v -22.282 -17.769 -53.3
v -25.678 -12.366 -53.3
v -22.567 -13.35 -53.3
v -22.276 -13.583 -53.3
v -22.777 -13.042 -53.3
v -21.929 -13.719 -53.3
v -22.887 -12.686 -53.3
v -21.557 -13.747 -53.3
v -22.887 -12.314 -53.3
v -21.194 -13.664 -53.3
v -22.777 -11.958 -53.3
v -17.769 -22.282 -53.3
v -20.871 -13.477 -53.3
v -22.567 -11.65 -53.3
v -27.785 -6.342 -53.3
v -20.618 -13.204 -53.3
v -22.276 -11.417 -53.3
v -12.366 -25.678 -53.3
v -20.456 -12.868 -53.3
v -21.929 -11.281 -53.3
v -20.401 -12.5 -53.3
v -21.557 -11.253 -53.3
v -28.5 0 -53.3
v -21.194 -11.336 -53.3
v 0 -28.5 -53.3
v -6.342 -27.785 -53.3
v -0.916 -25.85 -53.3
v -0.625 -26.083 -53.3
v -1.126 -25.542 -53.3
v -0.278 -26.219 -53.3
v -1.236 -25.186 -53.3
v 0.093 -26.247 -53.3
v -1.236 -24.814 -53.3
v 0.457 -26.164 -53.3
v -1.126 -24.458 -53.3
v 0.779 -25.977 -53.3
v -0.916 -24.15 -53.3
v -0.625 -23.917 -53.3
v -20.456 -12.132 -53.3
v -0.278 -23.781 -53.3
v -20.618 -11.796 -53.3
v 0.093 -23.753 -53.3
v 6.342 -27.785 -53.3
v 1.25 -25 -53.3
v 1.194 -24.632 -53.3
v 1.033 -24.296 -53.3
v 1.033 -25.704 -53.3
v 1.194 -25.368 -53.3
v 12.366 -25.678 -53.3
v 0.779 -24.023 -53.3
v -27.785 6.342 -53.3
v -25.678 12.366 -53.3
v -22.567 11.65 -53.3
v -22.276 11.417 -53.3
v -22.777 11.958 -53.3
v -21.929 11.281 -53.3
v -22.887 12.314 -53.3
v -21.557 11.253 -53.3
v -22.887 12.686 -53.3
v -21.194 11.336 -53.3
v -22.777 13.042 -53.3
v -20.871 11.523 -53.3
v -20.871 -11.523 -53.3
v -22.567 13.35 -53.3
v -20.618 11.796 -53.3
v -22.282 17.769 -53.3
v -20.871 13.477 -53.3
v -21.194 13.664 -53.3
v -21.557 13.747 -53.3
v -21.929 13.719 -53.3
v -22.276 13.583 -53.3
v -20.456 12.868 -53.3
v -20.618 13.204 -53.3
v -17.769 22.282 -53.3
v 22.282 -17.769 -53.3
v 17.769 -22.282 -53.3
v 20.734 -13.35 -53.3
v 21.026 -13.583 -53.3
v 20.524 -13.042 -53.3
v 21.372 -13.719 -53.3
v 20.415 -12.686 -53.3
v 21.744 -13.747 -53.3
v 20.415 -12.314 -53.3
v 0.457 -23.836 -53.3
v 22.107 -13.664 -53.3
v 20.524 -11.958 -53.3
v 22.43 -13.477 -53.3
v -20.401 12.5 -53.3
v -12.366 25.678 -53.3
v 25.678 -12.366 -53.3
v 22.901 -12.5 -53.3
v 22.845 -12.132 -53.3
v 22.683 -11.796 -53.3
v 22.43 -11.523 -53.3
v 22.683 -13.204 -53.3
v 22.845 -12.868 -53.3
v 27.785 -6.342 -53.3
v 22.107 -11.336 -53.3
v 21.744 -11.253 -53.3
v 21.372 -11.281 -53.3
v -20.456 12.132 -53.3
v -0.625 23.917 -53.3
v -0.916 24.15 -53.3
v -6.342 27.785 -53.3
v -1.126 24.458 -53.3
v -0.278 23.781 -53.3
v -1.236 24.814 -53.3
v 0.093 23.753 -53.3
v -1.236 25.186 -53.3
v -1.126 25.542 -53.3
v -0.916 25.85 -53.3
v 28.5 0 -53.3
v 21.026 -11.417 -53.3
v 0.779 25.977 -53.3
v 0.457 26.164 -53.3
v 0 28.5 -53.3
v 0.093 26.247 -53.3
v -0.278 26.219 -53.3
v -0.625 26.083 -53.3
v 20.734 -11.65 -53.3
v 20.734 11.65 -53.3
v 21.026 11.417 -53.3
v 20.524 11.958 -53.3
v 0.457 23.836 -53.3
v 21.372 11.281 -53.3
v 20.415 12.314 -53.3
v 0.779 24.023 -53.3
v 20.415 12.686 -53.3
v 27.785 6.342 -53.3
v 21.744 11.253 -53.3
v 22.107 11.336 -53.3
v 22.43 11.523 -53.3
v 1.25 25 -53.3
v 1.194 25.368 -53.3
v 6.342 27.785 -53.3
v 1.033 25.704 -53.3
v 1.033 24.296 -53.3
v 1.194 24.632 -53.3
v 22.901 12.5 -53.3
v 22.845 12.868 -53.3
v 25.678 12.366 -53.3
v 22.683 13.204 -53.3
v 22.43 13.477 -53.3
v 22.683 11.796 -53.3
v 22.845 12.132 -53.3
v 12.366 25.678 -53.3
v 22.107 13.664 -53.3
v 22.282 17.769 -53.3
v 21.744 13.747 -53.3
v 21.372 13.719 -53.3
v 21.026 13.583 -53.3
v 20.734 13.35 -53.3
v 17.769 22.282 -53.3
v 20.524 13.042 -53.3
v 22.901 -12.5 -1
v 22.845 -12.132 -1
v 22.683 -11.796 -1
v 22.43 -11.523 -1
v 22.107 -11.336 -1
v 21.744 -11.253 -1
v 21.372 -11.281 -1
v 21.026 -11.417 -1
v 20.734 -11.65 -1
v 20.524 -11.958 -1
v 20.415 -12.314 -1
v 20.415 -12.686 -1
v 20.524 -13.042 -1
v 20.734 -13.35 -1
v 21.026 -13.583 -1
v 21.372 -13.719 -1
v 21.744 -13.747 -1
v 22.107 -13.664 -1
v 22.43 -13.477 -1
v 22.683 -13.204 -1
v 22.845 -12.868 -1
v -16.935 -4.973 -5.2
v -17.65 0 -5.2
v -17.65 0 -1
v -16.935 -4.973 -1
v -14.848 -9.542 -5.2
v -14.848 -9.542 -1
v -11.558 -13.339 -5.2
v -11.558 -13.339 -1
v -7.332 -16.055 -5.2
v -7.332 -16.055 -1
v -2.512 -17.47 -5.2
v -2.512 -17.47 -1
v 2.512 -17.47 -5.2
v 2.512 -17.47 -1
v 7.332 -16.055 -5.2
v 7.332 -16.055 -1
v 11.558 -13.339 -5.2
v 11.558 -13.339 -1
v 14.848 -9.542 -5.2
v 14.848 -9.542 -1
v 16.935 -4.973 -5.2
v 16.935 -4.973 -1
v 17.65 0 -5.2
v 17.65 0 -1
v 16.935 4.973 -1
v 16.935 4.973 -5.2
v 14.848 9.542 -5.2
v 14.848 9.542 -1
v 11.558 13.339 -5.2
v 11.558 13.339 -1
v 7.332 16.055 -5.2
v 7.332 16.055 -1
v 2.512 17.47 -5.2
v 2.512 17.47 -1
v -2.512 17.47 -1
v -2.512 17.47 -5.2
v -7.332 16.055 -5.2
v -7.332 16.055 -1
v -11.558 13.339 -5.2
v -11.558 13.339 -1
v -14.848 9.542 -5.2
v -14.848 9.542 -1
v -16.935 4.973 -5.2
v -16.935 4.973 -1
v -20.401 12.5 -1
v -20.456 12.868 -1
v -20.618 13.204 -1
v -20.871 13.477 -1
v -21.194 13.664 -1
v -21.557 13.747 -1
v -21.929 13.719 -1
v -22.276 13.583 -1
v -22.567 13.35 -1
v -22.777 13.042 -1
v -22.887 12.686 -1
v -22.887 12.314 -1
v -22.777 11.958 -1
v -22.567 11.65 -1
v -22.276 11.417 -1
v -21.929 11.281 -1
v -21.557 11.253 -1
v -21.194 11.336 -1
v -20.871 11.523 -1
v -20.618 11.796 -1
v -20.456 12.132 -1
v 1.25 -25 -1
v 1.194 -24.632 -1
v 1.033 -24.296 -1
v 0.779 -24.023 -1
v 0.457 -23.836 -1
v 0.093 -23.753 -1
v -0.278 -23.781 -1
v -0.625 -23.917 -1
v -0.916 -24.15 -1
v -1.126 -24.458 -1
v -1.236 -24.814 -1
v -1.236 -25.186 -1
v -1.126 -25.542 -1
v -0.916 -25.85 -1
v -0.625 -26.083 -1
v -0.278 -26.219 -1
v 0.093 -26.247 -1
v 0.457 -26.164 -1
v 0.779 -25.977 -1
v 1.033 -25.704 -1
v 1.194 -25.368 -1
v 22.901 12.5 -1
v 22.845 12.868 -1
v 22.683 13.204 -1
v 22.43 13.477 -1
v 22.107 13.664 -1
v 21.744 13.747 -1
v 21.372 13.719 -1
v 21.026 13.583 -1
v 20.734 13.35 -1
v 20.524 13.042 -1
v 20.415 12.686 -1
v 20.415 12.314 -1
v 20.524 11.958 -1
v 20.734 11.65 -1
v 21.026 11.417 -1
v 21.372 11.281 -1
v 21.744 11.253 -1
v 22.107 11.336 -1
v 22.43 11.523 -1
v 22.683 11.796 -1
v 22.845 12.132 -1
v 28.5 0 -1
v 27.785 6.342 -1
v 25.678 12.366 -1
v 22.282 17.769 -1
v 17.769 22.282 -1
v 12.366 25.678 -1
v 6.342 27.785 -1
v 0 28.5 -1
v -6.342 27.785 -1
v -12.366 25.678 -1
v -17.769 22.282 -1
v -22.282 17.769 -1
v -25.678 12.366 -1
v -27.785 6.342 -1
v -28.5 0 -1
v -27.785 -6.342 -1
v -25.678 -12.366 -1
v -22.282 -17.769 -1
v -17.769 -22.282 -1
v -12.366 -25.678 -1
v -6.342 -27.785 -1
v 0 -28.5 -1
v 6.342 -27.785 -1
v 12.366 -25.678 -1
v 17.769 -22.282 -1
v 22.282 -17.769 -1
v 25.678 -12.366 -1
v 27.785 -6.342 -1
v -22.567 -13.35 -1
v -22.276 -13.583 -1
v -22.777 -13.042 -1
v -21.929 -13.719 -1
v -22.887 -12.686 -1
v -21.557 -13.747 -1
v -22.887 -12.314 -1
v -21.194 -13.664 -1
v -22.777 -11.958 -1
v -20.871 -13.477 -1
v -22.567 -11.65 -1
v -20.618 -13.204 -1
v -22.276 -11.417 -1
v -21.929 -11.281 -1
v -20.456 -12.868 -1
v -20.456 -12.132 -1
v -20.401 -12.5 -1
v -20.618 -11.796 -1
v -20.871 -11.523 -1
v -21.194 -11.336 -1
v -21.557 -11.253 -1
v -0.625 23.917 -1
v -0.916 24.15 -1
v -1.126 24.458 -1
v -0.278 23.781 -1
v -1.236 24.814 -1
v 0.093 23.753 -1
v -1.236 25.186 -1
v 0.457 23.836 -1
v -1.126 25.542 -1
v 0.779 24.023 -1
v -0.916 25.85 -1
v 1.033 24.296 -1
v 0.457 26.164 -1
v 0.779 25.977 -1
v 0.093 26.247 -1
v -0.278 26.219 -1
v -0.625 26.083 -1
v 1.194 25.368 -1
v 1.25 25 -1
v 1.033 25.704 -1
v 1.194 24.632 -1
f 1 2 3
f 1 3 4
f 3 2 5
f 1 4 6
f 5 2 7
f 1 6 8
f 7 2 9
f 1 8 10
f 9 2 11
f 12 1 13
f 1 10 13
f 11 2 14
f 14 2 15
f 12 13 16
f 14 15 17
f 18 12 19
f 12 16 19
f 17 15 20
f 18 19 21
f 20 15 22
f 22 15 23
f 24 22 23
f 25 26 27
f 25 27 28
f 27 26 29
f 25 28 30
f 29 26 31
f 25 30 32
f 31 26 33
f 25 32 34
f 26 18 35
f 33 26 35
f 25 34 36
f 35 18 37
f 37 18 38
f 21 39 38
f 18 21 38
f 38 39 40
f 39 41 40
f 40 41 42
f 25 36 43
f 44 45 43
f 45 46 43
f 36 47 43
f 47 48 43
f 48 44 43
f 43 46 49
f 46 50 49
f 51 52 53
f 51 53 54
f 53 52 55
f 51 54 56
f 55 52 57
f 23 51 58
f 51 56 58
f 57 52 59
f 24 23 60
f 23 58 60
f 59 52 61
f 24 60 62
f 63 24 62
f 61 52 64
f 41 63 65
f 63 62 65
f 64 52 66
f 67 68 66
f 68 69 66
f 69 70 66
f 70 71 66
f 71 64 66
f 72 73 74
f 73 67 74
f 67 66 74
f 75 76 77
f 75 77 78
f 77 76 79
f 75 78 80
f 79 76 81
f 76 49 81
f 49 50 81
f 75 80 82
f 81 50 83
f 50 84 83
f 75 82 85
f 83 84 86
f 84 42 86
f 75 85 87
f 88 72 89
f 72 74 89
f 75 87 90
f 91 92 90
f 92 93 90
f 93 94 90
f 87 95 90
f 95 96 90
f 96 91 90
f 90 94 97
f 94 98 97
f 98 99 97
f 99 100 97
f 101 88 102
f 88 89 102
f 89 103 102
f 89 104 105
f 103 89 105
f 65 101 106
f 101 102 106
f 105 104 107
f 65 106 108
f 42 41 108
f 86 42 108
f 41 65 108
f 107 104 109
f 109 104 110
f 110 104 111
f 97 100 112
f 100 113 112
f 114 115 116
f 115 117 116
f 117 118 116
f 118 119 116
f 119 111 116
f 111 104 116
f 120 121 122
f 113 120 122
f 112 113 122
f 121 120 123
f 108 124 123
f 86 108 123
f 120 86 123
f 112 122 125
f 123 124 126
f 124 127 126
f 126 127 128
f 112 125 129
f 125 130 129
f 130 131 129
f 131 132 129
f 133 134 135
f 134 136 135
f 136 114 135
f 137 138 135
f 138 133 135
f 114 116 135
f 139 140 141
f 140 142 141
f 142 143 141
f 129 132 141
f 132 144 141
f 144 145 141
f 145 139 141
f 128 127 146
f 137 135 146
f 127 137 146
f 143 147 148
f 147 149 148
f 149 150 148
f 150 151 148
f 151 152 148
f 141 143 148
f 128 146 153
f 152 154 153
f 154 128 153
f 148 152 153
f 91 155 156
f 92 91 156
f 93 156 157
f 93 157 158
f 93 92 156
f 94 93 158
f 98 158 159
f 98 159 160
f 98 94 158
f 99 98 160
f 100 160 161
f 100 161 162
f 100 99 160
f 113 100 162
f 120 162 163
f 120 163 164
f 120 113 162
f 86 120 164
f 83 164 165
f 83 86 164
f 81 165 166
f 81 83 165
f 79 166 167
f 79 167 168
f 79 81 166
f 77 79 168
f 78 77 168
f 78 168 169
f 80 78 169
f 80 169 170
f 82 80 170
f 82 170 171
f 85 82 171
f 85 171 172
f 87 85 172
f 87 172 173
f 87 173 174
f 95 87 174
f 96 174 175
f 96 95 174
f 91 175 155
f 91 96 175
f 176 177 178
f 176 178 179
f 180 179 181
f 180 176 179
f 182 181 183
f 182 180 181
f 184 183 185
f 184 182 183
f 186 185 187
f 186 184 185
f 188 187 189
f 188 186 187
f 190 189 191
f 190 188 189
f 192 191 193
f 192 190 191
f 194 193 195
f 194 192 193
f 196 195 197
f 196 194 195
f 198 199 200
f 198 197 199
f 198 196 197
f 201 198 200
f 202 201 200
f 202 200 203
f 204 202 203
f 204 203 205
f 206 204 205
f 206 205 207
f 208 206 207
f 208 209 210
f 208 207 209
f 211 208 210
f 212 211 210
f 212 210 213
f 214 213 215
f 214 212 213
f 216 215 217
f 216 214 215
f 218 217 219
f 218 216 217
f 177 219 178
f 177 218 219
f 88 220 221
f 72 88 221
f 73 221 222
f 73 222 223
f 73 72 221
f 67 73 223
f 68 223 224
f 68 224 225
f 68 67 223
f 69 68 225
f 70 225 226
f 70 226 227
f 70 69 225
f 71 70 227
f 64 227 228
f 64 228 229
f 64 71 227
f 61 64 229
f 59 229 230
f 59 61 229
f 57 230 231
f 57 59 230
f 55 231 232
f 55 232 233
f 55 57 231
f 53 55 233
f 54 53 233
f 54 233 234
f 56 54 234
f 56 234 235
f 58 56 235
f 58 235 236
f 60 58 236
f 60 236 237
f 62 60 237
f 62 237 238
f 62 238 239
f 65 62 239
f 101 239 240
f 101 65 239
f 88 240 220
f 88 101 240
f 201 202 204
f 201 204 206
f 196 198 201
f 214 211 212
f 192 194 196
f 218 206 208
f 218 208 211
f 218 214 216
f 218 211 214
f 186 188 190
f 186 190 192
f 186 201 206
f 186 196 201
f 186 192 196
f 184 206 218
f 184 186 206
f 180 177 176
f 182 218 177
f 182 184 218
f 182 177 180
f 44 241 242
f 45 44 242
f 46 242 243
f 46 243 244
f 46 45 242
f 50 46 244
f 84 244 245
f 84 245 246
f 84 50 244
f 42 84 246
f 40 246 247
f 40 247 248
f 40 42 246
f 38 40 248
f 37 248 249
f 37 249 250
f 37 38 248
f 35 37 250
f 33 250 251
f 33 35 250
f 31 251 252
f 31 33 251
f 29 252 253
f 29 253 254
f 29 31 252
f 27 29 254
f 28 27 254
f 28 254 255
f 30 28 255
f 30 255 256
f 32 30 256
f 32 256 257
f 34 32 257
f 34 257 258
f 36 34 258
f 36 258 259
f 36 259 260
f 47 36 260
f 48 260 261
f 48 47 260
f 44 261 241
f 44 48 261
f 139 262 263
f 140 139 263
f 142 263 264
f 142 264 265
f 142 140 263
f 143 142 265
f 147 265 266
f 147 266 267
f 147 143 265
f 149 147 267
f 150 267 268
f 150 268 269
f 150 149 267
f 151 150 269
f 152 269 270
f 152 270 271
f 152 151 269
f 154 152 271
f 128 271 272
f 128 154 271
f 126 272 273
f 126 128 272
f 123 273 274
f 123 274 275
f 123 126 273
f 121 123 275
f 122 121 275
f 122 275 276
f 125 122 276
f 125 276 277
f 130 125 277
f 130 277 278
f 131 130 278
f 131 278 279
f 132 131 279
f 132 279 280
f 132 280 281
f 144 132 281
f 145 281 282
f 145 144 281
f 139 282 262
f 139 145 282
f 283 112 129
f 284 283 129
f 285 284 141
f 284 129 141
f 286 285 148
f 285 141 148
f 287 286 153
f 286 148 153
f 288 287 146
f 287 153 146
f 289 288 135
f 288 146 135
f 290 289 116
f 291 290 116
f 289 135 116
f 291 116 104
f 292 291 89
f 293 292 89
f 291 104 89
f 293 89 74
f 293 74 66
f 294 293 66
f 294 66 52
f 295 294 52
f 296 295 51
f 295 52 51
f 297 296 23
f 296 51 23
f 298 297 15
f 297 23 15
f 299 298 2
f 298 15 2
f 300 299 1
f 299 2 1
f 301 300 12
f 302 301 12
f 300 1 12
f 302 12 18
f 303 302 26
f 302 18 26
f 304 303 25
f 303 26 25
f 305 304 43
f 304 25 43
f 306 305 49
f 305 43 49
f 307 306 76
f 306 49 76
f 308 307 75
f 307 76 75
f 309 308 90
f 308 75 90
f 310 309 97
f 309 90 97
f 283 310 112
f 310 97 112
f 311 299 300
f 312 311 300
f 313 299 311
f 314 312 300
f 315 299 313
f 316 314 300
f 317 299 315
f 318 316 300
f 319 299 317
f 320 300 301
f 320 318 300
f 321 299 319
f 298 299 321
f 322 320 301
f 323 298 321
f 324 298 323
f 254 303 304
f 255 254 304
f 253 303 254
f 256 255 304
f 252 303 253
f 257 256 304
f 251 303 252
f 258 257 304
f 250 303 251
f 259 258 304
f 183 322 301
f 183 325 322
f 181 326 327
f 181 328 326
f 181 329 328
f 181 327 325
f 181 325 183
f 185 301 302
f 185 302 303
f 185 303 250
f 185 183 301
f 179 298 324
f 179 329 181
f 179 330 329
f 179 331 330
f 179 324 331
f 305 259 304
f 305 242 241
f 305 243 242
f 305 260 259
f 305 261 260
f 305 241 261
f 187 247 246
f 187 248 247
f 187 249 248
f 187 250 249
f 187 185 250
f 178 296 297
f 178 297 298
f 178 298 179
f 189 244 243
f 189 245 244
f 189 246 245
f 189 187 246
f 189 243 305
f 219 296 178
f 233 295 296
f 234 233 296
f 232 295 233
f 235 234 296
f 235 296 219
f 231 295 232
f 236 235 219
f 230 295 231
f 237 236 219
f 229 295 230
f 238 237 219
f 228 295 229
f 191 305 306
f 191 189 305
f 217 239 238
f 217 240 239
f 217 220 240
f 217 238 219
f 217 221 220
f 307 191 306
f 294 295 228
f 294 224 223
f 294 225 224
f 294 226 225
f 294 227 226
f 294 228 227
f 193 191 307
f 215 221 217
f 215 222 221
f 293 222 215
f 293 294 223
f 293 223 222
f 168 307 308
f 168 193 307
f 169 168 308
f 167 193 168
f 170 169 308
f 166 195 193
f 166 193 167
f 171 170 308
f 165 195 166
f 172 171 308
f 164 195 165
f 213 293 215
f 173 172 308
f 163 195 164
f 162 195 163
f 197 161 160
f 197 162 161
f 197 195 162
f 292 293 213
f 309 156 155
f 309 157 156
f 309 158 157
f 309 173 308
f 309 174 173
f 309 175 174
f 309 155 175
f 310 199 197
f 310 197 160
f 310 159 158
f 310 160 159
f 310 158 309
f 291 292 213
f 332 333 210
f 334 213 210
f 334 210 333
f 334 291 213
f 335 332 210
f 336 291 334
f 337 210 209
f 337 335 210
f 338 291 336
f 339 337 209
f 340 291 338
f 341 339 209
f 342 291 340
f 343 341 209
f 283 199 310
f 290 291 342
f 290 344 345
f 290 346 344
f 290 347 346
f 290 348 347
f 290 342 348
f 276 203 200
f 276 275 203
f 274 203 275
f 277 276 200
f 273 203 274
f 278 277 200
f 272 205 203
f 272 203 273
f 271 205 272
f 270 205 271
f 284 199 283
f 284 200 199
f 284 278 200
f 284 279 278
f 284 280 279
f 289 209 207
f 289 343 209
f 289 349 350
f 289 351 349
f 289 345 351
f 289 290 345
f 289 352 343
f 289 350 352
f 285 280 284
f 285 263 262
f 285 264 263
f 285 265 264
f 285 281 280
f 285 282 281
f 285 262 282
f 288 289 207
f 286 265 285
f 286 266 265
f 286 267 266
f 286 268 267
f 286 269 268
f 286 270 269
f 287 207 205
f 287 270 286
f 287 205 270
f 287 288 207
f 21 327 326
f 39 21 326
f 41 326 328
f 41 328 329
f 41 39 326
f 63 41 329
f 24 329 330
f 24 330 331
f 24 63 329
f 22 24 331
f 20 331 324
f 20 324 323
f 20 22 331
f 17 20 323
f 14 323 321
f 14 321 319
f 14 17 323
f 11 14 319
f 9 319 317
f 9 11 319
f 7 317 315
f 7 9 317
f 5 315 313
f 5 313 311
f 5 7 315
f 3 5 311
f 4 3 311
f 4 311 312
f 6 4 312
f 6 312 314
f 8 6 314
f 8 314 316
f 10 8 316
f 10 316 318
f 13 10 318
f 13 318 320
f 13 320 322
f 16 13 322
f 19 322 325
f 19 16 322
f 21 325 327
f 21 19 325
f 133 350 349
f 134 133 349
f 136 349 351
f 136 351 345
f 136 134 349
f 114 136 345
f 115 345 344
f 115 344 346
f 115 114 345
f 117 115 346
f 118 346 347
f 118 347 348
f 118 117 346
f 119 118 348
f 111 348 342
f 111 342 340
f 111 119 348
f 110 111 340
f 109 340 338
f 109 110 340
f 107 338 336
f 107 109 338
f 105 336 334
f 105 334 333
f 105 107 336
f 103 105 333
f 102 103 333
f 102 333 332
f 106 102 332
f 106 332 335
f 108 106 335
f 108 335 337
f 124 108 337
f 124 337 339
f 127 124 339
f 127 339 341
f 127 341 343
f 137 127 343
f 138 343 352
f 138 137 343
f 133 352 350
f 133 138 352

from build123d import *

# Parameters (mm, degrees)
STATOR_ENVELOPE_START     = -53.3
PROFILE_1_R               = 28.5
PROFILE_1_R_2             = 1.25
STATOR_ENVELOPE_DEPTH     = 52.3
ROTOR_REVIEW_RECESS_START = -5.2
PROFILE_2_R               = 17.65
ROTOR_REVIEW_RECESS_DEPTH = 4.3


with BuildPart() as part:
    # Profile_1 → Stator_envelope (new body)
    with BuildSketch(Plane.XY.offset(STATOR_ENVELOPE_START)):
        Circle(PROFILE_1_R)
        with Locations((21.650635095, 12.5)):
            Circle(PROFILE_1_R_2, mode=Mode.SUBTRACT)
        with Locations((0, 25)):
            Circle(PROFILE_1_R_2, mode=Mode.SUBTRACT)
        with Locations((-21.650635095, 12.5)):
            Circle(PROFILE_1_R_2, mode=Mode.SUBTRACT)
        with Locations((-21.650635095, -12.5)):
            Circle(PROFILE_1_R_2, mode=Mode.SUBTRACT)
        with Locations((0, -25)):
            Circle(PROFILE_1_R_2, mode=Mode.SUBTRACT)
        with Locations((21.650635095, -12.5)):
            Circle(PROFILE_1_R_2, mode=Mode.SUBTRACT)
    extrude(amount=STATOR_ENVELOPE_DEPTH)

    # Profile_2 → Rotor_review_recess (cut)
    with BuildSketch(Plane.XY.offset(ROTOR_REVIEW_RECESS_START)):
        with Locations(Location((0, 0, 0), (0, 0, 180))):
            Circle(PROFILE_2_R)
    extrude(amount=ROTOR_REVIEW_RECESS_DEPTH, mode=Mode.SUBTRACT)


solid = part.part
